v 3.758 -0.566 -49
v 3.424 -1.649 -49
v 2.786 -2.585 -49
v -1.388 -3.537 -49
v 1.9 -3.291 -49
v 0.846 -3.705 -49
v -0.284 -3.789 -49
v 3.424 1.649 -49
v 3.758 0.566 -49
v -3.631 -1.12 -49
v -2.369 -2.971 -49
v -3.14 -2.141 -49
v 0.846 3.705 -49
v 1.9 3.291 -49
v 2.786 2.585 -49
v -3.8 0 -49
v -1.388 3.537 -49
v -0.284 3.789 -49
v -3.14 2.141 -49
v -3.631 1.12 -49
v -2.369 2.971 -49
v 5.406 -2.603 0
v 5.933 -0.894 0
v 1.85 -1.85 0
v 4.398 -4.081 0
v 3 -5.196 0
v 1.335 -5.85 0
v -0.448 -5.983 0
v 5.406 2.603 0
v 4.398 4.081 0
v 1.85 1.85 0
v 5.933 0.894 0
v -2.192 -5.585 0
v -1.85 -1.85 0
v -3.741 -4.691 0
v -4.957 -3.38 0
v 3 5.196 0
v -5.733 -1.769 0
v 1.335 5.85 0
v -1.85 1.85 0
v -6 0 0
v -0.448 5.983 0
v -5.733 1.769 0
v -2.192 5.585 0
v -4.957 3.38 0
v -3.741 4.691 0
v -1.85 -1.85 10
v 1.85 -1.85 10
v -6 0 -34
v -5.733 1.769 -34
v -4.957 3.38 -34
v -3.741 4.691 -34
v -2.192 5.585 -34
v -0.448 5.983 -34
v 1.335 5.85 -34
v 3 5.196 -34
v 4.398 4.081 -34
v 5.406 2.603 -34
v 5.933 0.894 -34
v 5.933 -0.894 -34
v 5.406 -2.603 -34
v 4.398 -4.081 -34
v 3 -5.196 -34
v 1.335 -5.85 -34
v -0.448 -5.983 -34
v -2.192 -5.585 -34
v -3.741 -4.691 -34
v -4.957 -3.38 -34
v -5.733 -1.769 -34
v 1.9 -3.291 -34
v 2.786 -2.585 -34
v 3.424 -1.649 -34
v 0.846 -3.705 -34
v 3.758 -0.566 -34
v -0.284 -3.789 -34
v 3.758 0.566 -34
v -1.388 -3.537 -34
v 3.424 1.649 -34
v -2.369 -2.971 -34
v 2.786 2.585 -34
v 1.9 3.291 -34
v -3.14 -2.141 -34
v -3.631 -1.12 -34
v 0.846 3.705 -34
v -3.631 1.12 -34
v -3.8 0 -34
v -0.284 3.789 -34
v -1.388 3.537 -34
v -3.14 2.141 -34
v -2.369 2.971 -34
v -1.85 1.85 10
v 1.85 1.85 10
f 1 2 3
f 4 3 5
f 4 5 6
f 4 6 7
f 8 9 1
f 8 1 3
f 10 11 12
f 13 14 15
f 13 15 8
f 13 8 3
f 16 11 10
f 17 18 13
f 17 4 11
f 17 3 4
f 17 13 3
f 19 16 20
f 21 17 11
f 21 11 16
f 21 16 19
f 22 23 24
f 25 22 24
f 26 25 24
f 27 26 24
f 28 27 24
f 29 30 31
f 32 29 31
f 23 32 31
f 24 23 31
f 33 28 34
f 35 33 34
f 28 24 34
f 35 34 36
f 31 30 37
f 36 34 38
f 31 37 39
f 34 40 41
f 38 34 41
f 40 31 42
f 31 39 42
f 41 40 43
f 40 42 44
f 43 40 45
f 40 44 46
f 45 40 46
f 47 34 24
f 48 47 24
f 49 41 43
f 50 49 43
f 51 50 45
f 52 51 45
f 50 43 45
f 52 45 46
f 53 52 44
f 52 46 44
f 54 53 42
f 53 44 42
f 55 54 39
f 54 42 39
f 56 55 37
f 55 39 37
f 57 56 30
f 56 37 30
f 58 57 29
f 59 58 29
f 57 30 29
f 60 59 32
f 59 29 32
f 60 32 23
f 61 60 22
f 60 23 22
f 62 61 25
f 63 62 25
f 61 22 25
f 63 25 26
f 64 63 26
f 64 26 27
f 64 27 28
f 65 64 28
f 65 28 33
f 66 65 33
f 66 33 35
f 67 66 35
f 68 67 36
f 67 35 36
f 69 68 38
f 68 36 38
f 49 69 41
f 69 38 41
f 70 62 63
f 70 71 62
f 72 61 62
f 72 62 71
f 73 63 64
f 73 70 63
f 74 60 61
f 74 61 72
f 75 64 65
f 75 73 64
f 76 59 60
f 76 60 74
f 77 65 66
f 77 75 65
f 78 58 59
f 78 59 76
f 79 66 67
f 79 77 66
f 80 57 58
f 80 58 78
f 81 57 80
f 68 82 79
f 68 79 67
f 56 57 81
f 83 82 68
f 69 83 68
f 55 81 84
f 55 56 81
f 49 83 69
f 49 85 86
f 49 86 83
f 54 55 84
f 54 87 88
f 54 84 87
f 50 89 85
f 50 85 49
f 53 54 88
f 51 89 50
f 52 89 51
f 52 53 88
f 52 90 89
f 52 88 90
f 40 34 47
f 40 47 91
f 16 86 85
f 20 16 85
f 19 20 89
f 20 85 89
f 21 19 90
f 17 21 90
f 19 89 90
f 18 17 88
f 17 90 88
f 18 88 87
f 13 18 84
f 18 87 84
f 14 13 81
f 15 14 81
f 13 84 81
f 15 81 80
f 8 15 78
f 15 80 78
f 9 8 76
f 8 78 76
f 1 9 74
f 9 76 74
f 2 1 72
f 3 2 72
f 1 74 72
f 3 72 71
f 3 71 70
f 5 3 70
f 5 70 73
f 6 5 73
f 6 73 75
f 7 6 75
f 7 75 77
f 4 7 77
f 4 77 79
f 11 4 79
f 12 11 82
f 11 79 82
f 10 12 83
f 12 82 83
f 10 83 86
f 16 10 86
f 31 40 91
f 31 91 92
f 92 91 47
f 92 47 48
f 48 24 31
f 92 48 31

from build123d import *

# Parameters (mm, degrees)
SKETCH1_W      = 3.7
SKETCH1_H      = 3.7
EXTRUDE1_DEPTH = 10
SKETCH2_R      = 6
EXTRUDE2_DEPTH = 34
SKETCH3_R      = 3.8
EXTRUDE3_DEPTH = 15


with BuildPart() as part:
    # Sketch1 → Extrude1 (new body)
    with BuildSketch(Plane.XY):
        Rectangle(SKETCH1_W, SKETCH1_H)
    extrude(amount=EXTRUDE1_DEPTH)

    # Sketch2 → Extrude2 (add)
    with BuildSketch(Plane(origin=(0, 0, 0), x_dir=(-1, 0, 0), z_dir=(0, 0, -1))):
        Circle(SKETCH2_R)
    extrude(amount=EXTRUDE2_DEPTH)

    # Sketch3 → Extrude3 (add)
    with BuildSketch(Plane(origin=(0, 0, -34), x_dir=(-1, 0, 0), z_dir=(0, 0, -1))):
        Circle(SKETCH3_R)
    extrude(amount=EXTRUDE3_DEPTH)


solid = part.part
